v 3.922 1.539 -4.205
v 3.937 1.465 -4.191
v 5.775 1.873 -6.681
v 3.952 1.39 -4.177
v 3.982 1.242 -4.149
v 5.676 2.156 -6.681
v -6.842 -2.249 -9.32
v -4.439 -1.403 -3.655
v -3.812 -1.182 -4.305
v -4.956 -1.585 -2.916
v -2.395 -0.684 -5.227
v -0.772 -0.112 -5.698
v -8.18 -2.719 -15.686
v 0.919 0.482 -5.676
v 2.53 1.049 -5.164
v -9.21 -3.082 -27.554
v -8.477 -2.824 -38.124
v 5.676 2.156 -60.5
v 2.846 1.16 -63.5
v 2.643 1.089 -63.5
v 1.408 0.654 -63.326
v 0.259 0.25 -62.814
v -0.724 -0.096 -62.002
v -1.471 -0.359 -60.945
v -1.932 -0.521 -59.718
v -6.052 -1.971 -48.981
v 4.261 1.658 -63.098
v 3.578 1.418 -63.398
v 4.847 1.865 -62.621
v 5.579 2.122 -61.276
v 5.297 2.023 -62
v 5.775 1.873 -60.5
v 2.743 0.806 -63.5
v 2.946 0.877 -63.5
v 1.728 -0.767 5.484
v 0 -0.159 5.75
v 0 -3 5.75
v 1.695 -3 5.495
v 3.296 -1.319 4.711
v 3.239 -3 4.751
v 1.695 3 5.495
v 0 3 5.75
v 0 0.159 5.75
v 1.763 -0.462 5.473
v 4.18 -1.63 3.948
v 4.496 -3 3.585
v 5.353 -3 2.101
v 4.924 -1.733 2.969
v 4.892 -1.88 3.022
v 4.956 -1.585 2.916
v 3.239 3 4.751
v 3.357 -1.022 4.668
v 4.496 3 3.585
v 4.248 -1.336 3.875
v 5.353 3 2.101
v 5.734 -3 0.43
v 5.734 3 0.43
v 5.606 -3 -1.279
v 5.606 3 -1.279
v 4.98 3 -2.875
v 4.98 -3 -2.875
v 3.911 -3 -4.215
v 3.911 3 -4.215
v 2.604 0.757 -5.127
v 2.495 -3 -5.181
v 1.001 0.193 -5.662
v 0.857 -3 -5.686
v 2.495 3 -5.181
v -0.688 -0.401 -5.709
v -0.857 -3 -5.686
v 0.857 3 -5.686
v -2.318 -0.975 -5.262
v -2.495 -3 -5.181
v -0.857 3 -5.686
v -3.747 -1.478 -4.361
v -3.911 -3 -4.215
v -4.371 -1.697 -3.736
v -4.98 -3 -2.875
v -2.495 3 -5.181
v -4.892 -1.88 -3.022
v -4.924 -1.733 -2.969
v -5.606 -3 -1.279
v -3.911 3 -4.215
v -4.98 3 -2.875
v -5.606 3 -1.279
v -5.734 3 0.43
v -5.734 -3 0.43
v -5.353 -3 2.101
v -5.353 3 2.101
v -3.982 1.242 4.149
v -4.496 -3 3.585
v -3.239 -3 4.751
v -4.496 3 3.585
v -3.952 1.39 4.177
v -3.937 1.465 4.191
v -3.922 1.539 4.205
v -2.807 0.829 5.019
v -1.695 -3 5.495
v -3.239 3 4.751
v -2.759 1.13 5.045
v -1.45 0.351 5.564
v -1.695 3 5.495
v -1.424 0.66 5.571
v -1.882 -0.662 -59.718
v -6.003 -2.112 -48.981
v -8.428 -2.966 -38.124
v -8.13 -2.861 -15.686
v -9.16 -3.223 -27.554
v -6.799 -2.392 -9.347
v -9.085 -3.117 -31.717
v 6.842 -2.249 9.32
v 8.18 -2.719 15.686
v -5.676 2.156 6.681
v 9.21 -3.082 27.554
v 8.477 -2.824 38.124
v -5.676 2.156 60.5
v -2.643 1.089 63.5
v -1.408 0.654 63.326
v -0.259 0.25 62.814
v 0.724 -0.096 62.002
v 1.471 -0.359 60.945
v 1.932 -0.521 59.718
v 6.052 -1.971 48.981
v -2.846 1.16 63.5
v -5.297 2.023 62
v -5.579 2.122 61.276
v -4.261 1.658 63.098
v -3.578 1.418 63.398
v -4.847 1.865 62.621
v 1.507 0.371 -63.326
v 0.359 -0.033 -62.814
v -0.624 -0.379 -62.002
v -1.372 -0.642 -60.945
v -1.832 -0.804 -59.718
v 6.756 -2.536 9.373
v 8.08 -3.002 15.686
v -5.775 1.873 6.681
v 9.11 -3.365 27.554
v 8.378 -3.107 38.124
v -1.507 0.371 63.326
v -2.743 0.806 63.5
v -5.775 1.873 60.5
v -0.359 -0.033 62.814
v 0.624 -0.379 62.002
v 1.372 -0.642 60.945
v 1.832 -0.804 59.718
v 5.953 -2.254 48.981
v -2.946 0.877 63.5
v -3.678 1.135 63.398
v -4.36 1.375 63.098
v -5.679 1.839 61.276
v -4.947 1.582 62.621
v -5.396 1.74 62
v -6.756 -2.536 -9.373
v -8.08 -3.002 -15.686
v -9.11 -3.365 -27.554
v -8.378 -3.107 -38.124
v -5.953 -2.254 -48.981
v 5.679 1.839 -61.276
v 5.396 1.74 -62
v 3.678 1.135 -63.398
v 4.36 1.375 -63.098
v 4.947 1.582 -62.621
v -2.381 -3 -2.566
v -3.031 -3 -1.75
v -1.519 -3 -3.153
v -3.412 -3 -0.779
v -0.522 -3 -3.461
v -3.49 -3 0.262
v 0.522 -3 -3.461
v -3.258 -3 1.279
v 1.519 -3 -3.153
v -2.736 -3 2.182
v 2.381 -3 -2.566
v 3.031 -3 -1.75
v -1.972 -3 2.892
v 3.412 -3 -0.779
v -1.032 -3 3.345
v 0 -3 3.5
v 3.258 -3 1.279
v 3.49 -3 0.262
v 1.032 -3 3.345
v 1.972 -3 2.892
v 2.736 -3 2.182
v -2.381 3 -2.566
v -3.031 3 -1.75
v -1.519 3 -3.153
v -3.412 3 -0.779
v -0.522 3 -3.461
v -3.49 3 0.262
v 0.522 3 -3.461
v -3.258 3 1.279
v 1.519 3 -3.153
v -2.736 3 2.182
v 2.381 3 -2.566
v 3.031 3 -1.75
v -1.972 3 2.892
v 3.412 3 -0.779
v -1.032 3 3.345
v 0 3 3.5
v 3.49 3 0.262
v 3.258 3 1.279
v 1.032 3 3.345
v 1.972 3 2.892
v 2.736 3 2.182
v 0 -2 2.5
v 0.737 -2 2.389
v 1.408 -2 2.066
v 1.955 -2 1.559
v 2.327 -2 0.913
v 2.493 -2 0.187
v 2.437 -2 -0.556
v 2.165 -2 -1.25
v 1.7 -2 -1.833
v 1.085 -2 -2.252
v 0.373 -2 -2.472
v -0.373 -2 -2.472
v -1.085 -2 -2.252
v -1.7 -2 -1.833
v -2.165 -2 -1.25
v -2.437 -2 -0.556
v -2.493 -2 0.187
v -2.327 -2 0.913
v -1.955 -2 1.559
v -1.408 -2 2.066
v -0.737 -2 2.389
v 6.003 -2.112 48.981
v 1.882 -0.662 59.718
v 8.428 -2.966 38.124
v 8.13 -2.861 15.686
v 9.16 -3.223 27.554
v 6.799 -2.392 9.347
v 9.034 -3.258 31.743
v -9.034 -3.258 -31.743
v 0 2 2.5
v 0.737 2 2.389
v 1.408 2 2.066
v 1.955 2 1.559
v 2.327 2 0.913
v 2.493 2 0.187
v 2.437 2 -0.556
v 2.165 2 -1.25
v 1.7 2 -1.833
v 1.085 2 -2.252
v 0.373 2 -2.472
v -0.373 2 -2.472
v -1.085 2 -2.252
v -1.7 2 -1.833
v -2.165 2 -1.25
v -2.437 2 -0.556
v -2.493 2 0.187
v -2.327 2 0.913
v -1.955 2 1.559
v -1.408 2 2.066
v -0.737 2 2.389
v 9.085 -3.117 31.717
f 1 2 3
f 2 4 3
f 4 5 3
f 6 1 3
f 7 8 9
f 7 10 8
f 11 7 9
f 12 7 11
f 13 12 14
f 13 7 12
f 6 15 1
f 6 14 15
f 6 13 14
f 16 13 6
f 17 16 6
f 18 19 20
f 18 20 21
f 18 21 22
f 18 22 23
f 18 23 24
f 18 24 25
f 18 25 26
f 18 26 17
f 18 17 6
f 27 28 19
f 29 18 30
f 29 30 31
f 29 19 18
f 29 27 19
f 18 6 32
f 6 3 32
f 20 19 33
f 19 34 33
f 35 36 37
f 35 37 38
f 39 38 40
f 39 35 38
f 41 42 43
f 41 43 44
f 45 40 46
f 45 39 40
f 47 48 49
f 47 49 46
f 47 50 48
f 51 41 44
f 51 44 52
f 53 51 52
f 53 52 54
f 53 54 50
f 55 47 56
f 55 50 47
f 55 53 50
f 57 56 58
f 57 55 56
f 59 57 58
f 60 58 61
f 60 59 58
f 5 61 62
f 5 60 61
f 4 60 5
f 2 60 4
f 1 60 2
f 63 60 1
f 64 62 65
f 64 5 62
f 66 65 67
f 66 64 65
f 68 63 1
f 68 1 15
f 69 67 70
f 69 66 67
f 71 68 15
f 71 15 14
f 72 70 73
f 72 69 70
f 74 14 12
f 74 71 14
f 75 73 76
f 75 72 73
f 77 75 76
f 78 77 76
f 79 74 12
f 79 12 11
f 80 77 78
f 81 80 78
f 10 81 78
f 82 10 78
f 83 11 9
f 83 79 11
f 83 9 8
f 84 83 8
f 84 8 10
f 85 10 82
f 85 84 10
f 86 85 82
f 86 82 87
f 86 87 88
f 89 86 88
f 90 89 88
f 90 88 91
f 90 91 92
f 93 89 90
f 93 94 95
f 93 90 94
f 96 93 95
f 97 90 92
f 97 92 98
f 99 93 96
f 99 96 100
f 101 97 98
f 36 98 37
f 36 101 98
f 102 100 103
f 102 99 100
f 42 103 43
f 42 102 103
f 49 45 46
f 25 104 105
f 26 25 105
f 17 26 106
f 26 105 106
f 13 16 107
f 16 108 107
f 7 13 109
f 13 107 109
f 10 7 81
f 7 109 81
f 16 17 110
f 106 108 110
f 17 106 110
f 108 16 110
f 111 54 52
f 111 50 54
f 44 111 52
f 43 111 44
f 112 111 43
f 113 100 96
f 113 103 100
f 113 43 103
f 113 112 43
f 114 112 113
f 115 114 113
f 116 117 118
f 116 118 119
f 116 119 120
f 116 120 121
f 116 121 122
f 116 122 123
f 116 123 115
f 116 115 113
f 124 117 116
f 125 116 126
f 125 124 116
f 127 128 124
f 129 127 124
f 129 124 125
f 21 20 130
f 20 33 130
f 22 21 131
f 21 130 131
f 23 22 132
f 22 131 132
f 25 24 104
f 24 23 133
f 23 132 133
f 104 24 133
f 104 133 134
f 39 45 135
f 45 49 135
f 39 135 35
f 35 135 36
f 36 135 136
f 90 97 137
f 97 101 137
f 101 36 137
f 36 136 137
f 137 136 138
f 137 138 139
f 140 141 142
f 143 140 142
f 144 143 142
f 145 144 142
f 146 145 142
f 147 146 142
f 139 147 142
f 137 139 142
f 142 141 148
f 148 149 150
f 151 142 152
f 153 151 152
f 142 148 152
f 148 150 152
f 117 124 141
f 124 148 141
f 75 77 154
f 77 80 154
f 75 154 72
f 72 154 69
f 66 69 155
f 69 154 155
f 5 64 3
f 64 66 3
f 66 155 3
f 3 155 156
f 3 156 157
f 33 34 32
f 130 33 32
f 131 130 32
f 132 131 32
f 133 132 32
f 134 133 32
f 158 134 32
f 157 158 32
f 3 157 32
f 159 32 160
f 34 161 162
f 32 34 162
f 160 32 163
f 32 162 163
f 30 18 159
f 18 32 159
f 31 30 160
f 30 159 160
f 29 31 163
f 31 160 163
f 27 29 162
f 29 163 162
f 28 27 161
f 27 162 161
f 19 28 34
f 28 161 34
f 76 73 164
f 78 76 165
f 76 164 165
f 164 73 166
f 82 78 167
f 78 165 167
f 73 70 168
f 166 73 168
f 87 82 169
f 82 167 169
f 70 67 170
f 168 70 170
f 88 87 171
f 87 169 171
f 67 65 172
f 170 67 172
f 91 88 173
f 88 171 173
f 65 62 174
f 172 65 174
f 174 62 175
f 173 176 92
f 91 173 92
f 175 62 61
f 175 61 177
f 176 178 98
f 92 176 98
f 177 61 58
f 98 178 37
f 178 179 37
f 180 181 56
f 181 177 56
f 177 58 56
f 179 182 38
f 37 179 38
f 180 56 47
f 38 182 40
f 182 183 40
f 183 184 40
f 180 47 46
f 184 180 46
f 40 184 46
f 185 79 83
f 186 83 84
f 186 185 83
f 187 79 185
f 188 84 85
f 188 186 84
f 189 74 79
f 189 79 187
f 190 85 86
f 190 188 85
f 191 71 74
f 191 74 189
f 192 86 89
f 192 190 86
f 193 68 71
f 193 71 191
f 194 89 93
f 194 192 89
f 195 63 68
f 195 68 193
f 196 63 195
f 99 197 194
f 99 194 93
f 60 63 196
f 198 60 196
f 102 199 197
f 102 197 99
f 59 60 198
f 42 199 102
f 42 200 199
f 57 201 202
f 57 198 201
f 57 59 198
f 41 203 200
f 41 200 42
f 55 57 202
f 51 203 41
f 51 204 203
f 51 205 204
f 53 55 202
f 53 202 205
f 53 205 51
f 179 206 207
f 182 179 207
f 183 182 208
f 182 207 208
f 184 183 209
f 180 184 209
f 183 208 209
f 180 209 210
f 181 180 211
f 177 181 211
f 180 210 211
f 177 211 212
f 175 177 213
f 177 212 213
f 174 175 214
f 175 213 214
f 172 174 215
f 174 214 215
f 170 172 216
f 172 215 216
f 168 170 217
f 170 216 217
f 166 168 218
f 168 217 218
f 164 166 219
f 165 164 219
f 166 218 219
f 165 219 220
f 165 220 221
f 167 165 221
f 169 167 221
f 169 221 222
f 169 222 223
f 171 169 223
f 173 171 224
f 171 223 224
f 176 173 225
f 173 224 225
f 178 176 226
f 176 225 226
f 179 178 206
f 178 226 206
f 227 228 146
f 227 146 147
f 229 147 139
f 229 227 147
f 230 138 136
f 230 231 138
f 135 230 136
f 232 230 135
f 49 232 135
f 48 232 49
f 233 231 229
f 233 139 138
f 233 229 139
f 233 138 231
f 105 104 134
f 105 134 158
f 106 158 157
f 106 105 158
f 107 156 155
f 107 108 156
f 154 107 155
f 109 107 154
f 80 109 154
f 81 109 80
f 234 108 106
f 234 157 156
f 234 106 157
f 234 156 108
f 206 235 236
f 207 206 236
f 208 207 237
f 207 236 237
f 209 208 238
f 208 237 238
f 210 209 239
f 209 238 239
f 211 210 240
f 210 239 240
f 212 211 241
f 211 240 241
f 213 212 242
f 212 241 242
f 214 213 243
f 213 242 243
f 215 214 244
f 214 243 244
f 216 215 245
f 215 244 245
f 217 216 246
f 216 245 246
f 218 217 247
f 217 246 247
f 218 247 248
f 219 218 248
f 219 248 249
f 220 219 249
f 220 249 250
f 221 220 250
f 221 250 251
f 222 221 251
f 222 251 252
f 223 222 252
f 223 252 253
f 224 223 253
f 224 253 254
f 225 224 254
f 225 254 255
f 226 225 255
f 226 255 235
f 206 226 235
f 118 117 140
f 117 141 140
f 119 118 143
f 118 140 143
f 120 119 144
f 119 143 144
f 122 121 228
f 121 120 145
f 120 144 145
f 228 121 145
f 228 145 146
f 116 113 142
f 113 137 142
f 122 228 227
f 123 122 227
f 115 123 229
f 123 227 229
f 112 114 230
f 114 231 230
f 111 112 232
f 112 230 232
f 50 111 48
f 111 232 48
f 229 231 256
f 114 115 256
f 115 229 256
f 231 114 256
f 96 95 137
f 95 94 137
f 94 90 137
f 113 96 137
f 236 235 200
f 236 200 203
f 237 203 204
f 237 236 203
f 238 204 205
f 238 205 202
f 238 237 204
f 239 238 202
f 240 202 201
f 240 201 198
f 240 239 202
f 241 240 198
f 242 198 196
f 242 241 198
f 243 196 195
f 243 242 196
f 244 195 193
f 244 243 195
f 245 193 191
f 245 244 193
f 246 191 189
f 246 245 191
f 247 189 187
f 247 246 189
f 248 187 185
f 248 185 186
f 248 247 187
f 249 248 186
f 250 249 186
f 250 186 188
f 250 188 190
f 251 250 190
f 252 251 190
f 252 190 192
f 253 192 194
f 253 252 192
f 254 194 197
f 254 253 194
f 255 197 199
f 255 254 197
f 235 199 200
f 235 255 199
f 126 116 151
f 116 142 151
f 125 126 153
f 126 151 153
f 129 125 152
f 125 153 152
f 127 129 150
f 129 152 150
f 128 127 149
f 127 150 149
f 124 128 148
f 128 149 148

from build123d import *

# Parameters (mm, degrees)
SKETCH1_R           = 5.75
BOSS_EXTRUDE1_DEPTH = 3
BOSS_EXTRUDE2_DEPTH = 0.15
CIRPATTERN1_COUNT   = 2
SKETCH4_R           = 2.5
CUT_EXTRUDE1_DEPTH  = 65.47946021
CHAMFER1_SIZE       = 1


with BuildPart() as part:
    # Sketch1 → Boss-Extrude1 (new, symmetric)
    with BuildSketch(Plane(origin=(0, 0, 0), x_dir=(1, 0, 0), z_dir=(0, 1, 0))):
        with Locations(Location((0, 0, 0), (0, 0, 270))):
            Circle(SKETCH1_R)
    extrude(amount=BOSS_EXTRUDE1_DEPTH, both=True)

    # Sketch3 → Boss-Extrude2 (add, symmetric)
    with BuildSketch(Plane(origin=(0, 0, 0), x_dir=(0.9433030867471315, -0.3319326536111411, 0), z_dir=(-0.3319326536111411, -0.9433030867471315, 0))):
        with BuildLine():
            Line((-3.485399679, 3.239580817), (-6.069792392, 6.68067591))
            Line((-6.069792392, 6.68067591), (-6.069792392, 60.5))
            ThreePointArc((-6.069792392, 60.5), (-5.191112735, 62.621320344), (-3.069792392, 63.5))
            Line((-3.069792392, 63.5), (-2.854583135, 63.5))
            ThreePointArc((-2.854583135, 63.5), (0.220398514, 62.442649853), (1.994847243, 59.717795145))
            add(Edge.make_bspline(
                [(1.994847243, 59.717795145), (15.859721153, 31.612778986), (4.812953003, 1.848788557)],
                knots=[0, 0, 0, 1, 1, 1], degree=2))
            add(Edge.make_bspline(
                [(-3.485399679, 3.239580817), (0.91627292, 7.753975077), (4.812953003, 1.848788557)],
                knots=[0, 0, 0, 1, 1, 1], degree=2))
        make_face()
    boss_extrude2 = extrude(amount=BOSS_EXTRUDE2_DEPTH, both=True)

    # CirPattern1: Boss-Extrude2 ×2 about axis
    cirpattern1_axis = Axis((0, 3, 0), (0, -1, 0))
    for i in range(1, CIRPATTERN1_COUNT):
        add(boss_extrude2.rotate(cirpattern1_axis, i * 360 / CIRPATTERN1_COUNT))

    # Sketch4 → Cut-Extrude1 (cut, through all)
    with BuildSketch(Plane(origin=(0, 3, 0), x_dir=(1, 0, 0), z_dir=(0, 1, 0))):
        with Locations(Location((0, 0, 0), (0, 0, 270))):
            Circle(SKETCH4_R)
    extrude(amount=-CUT_EXTRUDE1_DEPTH, mode=Mode.SUBTRACT)

    # Chamfer1
    chamfer1_edges = [part.edges().sort_by_distance(p)[0] for p in [
        (0, -3, -2.5),
        (0, 3, -2.5),
    ]]
    chamfer(chamfer1_edges, length=CHAMFER1_SIZE)


solid = part.part
